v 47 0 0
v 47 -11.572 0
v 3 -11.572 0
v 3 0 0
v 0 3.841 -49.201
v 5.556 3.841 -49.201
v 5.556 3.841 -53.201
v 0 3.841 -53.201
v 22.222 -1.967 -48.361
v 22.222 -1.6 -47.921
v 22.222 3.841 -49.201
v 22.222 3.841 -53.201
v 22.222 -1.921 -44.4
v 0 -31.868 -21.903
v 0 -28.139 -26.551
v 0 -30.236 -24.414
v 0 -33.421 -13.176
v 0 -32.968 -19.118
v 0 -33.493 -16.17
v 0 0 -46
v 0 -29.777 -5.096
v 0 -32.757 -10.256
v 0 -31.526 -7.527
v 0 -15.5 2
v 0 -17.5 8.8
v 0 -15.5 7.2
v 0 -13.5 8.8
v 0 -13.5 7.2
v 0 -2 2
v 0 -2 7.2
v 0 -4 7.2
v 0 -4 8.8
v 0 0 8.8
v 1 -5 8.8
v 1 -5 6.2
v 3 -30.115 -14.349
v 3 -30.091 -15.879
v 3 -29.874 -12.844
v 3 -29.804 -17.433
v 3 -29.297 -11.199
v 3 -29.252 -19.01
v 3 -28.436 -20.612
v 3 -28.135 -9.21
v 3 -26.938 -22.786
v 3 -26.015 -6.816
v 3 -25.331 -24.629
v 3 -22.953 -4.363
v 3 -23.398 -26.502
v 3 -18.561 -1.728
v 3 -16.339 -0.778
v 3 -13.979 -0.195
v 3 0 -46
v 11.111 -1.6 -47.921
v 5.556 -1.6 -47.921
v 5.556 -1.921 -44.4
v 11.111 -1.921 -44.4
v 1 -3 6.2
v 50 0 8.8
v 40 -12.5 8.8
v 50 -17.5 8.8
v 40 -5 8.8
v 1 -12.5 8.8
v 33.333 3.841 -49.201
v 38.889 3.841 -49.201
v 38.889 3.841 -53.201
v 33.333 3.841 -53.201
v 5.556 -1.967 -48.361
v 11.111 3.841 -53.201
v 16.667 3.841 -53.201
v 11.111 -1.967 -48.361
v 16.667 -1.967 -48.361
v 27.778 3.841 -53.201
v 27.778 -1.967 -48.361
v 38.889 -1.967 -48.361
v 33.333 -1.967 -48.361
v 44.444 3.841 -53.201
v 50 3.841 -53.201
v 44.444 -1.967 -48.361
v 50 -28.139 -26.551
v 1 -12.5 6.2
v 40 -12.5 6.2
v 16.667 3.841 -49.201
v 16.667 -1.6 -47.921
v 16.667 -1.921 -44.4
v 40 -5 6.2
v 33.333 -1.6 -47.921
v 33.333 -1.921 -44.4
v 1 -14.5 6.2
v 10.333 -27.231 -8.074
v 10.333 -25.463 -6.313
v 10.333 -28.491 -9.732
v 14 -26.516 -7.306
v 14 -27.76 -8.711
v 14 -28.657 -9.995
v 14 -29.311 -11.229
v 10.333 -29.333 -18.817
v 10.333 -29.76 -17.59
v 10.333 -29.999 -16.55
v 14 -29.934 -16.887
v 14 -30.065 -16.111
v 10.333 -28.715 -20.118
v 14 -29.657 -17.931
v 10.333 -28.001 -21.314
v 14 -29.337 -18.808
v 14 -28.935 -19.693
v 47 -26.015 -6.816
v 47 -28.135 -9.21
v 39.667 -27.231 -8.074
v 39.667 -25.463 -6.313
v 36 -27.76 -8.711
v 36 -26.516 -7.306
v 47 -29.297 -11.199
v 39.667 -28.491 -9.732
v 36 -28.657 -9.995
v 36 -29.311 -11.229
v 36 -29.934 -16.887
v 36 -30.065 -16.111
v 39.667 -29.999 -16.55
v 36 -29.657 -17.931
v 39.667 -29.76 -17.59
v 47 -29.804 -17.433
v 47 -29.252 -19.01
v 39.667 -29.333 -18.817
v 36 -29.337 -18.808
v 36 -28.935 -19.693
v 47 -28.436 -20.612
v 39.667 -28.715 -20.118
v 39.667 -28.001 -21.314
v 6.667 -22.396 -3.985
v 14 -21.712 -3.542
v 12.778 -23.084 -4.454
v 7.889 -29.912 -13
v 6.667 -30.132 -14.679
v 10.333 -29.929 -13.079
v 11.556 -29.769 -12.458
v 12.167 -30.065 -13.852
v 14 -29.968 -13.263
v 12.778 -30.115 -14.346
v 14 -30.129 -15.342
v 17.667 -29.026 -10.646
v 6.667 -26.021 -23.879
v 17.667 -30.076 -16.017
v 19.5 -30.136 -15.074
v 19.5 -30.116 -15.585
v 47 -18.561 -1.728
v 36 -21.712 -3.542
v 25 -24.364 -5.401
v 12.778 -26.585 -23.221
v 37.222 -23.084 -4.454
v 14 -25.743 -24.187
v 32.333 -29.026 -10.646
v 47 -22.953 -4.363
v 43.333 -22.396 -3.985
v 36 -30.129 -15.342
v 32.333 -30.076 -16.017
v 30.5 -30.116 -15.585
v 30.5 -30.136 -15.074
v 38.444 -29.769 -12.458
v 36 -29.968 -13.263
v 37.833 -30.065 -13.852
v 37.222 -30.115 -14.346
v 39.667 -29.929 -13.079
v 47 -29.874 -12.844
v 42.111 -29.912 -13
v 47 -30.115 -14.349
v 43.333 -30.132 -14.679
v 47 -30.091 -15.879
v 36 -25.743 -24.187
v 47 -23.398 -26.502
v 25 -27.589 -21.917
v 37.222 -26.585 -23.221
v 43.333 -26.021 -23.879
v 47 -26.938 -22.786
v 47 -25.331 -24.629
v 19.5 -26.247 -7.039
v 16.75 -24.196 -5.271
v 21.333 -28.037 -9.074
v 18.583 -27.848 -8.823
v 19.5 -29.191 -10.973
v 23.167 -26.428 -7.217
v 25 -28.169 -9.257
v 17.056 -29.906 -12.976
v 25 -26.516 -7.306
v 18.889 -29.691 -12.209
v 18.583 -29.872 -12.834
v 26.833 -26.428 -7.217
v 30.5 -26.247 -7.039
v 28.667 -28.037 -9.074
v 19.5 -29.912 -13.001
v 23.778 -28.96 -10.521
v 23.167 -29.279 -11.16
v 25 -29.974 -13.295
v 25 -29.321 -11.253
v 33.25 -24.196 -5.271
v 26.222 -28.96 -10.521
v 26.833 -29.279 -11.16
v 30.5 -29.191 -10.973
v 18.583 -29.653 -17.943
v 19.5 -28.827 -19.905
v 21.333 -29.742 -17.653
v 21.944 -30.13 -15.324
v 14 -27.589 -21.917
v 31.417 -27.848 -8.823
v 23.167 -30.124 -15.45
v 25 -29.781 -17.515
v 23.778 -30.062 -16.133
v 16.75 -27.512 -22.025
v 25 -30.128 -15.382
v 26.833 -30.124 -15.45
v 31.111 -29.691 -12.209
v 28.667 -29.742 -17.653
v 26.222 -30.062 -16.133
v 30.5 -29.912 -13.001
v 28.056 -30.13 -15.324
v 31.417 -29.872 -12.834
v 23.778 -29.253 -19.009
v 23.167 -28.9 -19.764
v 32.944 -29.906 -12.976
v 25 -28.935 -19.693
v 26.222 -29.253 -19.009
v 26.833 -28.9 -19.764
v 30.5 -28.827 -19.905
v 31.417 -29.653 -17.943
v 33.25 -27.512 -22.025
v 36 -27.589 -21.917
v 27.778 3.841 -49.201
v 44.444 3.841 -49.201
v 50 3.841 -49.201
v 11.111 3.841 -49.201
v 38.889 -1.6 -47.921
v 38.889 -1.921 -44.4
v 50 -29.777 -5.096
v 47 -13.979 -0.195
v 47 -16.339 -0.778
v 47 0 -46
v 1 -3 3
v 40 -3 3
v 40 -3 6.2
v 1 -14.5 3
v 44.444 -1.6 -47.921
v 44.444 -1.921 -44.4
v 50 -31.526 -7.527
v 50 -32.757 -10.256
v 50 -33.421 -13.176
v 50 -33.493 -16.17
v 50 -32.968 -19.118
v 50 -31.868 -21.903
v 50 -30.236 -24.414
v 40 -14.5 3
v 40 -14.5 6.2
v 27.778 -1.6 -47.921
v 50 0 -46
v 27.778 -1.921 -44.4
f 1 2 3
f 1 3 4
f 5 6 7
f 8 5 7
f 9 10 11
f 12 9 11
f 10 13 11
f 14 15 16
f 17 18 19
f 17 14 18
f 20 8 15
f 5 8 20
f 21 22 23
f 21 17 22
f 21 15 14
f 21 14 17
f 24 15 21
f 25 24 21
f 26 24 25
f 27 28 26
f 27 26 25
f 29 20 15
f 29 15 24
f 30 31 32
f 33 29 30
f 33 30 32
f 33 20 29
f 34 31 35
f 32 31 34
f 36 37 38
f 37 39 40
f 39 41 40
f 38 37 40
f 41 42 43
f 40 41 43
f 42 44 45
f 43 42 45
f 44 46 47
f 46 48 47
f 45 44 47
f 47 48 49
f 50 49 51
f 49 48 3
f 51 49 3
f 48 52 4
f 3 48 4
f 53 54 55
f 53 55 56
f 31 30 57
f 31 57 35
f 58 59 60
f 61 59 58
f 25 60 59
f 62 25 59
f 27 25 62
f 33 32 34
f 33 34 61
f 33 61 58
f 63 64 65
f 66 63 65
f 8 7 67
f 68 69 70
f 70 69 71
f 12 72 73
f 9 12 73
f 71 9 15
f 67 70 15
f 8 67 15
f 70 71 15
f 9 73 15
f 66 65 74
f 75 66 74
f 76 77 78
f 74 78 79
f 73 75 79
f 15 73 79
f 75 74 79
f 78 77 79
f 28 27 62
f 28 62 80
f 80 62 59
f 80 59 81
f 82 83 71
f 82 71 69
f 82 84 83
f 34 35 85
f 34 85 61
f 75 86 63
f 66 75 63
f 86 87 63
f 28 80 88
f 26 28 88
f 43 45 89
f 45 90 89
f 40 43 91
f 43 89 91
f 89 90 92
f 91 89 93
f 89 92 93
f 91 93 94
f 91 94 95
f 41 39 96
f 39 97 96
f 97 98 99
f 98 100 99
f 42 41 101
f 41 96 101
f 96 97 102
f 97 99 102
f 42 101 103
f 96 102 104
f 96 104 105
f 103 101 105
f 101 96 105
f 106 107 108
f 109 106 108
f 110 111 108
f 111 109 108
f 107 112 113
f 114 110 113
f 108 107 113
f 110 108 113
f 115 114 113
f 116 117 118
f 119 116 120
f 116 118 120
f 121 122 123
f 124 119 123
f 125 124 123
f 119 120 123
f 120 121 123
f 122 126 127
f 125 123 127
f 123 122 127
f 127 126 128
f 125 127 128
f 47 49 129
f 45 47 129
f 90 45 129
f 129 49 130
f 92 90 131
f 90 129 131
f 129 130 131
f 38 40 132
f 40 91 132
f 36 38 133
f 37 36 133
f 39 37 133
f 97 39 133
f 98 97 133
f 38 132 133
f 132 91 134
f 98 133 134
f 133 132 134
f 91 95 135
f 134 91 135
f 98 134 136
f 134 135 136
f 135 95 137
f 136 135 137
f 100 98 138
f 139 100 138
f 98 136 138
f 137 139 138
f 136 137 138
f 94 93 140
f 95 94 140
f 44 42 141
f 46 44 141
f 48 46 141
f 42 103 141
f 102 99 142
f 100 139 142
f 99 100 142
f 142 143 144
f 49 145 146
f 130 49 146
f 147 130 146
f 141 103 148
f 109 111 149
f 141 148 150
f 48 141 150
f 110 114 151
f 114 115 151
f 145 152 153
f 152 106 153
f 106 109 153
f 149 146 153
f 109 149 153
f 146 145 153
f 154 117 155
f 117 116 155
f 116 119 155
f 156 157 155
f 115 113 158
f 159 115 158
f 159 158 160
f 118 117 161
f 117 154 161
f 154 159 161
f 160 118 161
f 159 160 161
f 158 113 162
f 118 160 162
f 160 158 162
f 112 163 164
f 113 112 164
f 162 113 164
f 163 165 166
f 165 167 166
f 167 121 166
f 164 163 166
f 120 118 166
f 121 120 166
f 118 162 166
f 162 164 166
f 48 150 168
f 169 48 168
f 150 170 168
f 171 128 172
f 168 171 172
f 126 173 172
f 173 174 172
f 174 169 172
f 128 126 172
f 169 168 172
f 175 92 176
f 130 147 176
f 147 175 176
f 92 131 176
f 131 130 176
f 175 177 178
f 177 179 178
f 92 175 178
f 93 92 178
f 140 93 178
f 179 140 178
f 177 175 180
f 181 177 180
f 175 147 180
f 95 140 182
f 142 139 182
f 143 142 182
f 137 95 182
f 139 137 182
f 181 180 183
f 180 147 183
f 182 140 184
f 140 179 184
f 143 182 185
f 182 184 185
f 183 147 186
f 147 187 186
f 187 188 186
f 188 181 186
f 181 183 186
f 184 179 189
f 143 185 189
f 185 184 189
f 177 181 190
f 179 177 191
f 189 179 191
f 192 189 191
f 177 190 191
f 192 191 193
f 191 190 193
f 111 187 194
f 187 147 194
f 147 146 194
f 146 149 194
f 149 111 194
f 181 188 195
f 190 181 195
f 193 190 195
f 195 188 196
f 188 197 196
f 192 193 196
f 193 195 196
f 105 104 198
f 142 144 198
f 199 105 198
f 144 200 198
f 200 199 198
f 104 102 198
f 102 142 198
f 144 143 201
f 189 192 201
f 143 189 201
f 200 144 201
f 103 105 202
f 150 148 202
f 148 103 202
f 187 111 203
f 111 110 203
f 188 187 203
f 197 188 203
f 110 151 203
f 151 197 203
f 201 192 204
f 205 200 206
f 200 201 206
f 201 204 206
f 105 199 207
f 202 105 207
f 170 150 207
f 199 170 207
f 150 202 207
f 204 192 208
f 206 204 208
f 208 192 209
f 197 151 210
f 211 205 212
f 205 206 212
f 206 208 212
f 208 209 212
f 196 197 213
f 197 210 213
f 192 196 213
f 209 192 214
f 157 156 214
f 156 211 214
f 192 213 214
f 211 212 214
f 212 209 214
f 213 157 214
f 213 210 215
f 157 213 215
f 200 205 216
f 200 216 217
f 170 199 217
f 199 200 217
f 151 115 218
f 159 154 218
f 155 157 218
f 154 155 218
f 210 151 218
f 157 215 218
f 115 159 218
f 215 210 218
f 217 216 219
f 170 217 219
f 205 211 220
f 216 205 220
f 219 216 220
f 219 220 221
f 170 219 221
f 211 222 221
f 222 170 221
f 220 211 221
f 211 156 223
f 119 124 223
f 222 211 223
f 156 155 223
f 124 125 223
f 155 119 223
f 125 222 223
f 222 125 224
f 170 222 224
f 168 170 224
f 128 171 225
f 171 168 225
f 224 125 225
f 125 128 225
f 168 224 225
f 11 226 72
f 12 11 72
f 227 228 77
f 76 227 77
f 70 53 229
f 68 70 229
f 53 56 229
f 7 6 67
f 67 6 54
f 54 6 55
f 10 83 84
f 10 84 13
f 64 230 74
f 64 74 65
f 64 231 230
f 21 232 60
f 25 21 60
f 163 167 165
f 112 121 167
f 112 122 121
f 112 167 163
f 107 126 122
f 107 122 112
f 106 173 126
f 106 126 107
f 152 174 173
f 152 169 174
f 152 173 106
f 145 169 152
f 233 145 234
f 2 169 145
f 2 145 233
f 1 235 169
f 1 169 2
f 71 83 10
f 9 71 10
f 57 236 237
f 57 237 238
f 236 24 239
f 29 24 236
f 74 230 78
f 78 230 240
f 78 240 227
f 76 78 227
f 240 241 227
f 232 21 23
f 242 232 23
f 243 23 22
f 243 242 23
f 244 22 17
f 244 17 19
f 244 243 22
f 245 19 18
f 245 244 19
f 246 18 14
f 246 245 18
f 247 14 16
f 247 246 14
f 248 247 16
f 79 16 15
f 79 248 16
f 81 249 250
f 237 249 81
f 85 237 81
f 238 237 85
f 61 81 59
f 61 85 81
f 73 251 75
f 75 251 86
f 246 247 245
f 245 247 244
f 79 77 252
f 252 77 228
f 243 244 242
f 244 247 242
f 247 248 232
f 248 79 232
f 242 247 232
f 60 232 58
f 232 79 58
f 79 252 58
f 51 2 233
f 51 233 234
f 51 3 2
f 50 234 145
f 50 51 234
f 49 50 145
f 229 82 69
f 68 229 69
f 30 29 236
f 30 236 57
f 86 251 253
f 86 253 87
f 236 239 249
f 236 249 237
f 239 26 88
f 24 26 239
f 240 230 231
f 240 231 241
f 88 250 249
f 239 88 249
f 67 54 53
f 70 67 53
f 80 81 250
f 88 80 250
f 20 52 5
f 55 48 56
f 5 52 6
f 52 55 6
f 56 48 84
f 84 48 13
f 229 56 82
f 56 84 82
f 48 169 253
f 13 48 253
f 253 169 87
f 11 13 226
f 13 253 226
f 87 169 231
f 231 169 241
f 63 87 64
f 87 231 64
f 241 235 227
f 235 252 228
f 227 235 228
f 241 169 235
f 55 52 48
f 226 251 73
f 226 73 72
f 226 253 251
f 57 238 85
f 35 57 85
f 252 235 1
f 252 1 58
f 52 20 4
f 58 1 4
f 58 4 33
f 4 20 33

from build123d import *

# Parameters (mm, degrees)
BOSS_EXTRUDE1_DEPTH = 50
BOSS_EXTRUDE2_DEPTH = 10
FILLET1_R           = 15
CUT_EXTRUDE1_START  = -3
CUT_EXTRUDE1_DEPTH  = 44
FILLET2_R           = 15
BOSS_EXTRUDE3_DEPTH = 50
SKETCH5_W           = 5.55555544444444
SKETCH5_H           = 7.560737598657919
SKETCH5_W_2         = 5.5555554444444475
SKETCH5_W_3         = 5.555555444444444
CUT_EXTRUDE2_DEPTH  = 68.02665161849878
CHAMFER1_SIZE       = 2.5
CHAMFER2_SIZE       = 1


with BuildPart() as part:
    # Sketch1 → Boss-Extrude1 (new body)
    with BuildSketch(Plane(origin=(0, 0, 0), x_dir=(0, 0, -1), z_dir=(1, 0, 0))):
        Polygon((0, 0), (50.00000000000001, 0), (16.66666666666667, -40), (-8.800000000000015, -17.499999999999996), (-8.800000000000015, -12.499999999999998), (-6.200000000000014, -12.499999999999998), (-6.200000000000013, -14.499999999999998), (-2.9999999999999982, -14.499999999999998), (-2.9999999999999982, -3), (-6.200000000000013, -3), (-6.200000000000014, -4.999999999999999), (-8.800000000000015, -4.999999999999999), (-8.800000000000017, -1.08e-15), align=None)
    extrude(amount=BOSS_EXTRUDE1_DEPTH)

    # Sketch2 → Boss-Extrude2 (add)
    with BuildSketch(Plane(origin=(50, 0, 0), x_dir=(0, 0, -1), z_dir=(1, 0, 0))):
        Polygon((-8.800000000000017, -1.08e-15), (-0.800000000000016, 0), (-0.8000000000000138, -17.499999999999996), (-8.800000000000015, -17.499999999999996), align=None)
    extrude(amount=-BOSS_EXTRUDE2_DEPTH)

    # Fillet1
    fillet1_edges = [part.edges().sort_by_distance(p)[0] for p in [
        (25, -40, -16.66666666666667),
    ]]
    fillet(fillet1_edges, radius=FILLET1_R)

    # Sketch3 → Cut-Extrude1 (cut)
    with BuildSketch(Plane(origin=(50, 0, 0), x_dir=(0, 0, -1), z_dir=(1, 0, 0)).offset(CUT_EXTRUDE1_START)):
        with BuildLine():
            Line((46.000000000000014, 0), (26.501646387603547, -23.398024334875757))
            add(Edge.make_bspline(
                [(0, -15), (11.33309259276565, -40.236961436031486), (26.501646387603547, -23.398024334875757)],
                knots=[0, 0, 0, 1, 1, 1], degree=2))
            Line((0, -15), (0, 0))
            Line((0, 0), (46.000000000000014, 0))
        make_face()
    extrude(amount=-CUT_EXTRUDE1_DEPTH, mode=Mode.SUBTRACT)

    # Fillet2
    fillet2_edges = [part.edges().sort_by_distance(p)[0] for p in [
        (25, -15, 0),
    ]]
    fillet(fillet2_edges, radius=FILLET2_R)

    # Sketch4 → Boss-Extrude3 (add, through all)
    with BuildSketch(Plane(origin=(50, 0, 0), x_dir=(0, 0, -1), z_dir=(1, 0, 0))):
        Polygon((50.00000000000001, 0), (46.000000000000014, 0), (49.20092199832241, 3.841106397986878), (53.20092199832241, 3.841106397986878), align=None)
    extrude(amount=-BOSS_EXTRUDE3_DEPTH)

    # Sketch5 → Cut-Extrude2 (cut, through all)
    with BuildSketch(Plane(origin=(0, -22.622950819672138, -27.147540983606568), x_dir=(1, 0, 0), z_dir=(0, 0.6401843996644799, 0.7682212795973757))):
        Polygon((11.111111, 29.44848238456608), (11.111111, 37.009219983224), (5.555555555555555, 37.009219983224), (5.555555555555556, 29.44848238456608), align=None)
        with Locations((19.444444277777777, 33.22885118389504)):
            Rectangle(SKETCH5_W, SKETCH5_H)
        with Locations((30.555555277777778, 33.22885118389504)):
            Rectangle(SKETCH5_W_2, SKETCH5_H)
        with Locations((41.66666627777778, 33.22885118389504)):
            Rectangle(SKETCH5_W_3, SKETCH5_H)
    extrude(amount=-CUT_EXTRUDE2_DEPTH, mode=Mode.SUBTRACT)

    # Chamfer1
    chamfer1_edges = [part.edges().sort_by_distance(p)[0] for p in [
        (8.333333277777777, -3.55e-15, -46.000000000000014),
        (19.444444277777777, -3.55e-15, -46.000000000000014),
        (30.555555277777778, -3.55e-15, -46.000000000000014),
        (41.66666627777778, -3.55e-15, -46.000000000000014),
    ]]
    chamfer(chamfer1_edges, length=CHAMFER1_SIZE)

    # Chamfer2
    chamfer2_edges = [part.edges().sort_by_distance(p)[0] for p in [
        (0, -12.499999999999998, 7.500000000000014),
        (0, -13.499999999999998, 6.2000000000000135),
        (0, -14.499999999999998, 4.600000000000005),
        (0, -8.75, 2.9999999999999982),
        (0, -3, 4.600000000000005),
        (0, -3.9999999999999996, 6.2000000000000135),
        (0, -4.999999999999999, 7.500000000000014),
    ]]
    chamfer(chamfer2_edges, length=CHAMFER2_SIZE)


solid = part.part
